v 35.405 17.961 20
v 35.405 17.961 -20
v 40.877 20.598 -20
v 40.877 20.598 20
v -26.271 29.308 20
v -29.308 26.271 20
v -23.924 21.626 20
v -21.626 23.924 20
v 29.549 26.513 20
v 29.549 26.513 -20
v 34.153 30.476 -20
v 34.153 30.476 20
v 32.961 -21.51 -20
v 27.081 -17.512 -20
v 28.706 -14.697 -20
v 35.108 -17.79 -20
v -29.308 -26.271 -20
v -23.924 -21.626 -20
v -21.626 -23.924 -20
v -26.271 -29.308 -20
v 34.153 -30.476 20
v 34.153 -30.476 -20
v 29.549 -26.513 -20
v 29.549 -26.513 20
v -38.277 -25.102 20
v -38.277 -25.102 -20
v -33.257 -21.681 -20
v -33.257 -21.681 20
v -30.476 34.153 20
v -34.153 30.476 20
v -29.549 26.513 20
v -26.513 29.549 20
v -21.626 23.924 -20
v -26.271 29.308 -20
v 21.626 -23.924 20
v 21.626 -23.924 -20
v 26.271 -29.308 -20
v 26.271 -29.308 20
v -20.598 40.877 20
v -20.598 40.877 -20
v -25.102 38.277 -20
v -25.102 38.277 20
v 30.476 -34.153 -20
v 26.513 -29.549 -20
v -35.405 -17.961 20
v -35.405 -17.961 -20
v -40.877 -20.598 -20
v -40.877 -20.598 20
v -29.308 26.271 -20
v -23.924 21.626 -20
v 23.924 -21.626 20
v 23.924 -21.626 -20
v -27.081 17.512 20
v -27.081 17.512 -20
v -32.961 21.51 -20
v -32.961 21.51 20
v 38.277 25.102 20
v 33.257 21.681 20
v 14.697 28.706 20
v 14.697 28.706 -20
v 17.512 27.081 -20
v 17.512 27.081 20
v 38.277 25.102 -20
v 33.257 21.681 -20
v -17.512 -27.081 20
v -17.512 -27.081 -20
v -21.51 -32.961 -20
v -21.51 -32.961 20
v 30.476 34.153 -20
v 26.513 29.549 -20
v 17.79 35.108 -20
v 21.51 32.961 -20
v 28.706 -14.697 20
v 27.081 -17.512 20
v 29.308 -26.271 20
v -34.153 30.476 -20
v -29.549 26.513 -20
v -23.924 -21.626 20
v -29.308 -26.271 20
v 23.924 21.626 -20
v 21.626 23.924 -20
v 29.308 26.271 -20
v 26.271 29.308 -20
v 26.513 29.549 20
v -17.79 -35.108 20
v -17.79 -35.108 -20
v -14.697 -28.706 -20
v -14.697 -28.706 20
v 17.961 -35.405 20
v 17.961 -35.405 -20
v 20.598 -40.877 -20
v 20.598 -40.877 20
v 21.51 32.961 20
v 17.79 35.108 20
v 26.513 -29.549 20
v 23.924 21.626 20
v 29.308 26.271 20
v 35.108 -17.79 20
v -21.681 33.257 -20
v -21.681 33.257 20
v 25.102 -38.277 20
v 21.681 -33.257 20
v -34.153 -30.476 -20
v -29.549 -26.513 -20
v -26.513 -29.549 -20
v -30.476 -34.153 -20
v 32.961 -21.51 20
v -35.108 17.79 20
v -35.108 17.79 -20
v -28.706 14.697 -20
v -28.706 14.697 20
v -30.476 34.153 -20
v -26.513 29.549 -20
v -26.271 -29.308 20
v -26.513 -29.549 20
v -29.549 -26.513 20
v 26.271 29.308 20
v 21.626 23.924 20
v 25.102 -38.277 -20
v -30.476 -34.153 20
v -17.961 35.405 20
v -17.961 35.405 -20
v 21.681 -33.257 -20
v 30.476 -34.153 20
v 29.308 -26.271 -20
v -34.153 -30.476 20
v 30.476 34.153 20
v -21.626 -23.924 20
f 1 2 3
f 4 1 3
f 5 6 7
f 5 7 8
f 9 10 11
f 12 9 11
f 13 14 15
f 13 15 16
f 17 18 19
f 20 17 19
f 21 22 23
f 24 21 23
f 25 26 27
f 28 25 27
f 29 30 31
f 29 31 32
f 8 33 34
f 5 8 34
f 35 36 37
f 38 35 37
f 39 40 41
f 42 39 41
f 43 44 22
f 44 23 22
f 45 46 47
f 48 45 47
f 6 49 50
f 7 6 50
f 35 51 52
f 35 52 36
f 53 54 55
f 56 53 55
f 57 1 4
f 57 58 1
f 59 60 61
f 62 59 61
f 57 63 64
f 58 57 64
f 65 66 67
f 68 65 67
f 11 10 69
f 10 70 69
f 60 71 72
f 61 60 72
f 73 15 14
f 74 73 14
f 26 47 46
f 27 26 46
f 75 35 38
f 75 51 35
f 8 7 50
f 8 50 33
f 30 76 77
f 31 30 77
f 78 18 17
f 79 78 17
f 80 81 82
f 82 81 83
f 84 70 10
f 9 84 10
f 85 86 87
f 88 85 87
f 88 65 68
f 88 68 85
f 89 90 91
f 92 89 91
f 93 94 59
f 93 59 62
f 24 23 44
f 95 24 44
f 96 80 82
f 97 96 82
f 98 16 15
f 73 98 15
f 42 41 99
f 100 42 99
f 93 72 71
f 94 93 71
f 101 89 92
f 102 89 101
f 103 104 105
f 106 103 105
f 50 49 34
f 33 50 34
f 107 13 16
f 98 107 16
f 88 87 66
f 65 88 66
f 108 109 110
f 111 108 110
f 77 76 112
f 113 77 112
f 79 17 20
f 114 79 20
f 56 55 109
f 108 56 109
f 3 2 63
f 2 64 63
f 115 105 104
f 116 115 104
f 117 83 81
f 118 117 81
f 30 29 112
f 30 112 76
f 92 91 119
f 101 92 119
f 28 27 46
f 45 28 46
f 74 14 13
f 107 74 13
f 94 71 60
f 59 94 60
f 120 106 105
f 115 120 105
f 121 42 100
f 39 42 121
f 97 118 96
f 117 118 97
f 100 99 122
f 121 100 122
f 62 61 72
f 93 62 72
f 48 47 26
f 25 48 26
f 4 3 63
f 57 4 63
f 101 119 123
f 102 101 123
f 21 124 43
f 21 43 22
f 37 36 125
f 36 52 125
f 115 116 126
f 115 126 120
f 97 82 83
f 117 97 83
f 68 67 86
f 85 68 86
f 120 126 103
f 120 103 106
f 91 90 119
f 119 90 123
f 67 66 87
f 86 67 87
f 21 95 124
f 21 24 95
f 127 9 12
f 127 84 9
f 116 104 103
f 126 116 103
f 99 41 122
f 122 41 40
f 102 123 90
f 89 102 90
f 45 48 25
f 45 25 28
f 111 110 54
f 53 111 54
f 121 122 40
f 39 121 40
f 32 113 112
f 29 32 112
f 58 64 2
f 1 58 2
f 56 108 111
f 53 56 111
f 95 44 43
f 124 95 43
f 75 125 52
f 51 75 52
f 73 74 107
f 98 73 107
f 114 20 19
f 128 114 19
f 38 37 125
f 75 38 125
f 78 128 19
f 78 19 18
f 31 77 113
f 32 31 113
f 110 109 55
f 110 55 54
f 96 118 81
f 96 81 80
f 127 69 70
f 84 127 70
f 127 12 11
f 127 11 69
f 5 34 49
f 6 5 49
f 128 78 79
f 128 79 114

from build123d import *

# Parameters (mm, degrees)
COIL_SIDES_START    = -20
COIL_SIDES_DEPTH    = 40
COIL_SIDES_2_DEPTH  = 40
COIL_SIDES_3_DEPTH  = 40
COIL_SIDES_4_DEPTH  = 40
COIL_SIDES_5_DEPTH  = 40
COIL_SIDES_6_DEPTH  = 40
COIL_SIDES_7_DEPTH  = 40
COIL_SIDES_8_DEPTH  = 40
COIL_SIDES_9_DEPTH  = 40
COIL_SIDES_10_DEPTH = 40
COIL_SIDES_11_DEPTH = 40
COIL_SIDES_12_DEPTH = 40
COIL_SIDES_13_DEPTH = 40
COIL_SIDES_14_DEPTH = 40
COIL_SIDES_15_DEPTH = 40
COIL_SIDES_16_DEPTH = 40


with BuildPart() as part:
    # Эскиз1 → Coil_sides (new body)
    with BuildSketch(Plane.XY.offset(COIL_SIDES_START)):
        Polygon((35.404539789, 17.961307368), (40.877360953, 20.59833395), (38.277360953, 25.10166605), (33.25721836, 21.680577182), align=None)
    extrude(amount=COIL_SIDES_DEPTH)


with BuildPart() as body_2:
    # Эскиз1 → Coil_sides 2 (new body)
    with BuildSketch(Plane.XY.offset(COIL_SIDES_START)):
        Polygon((23.924274918, 21.626177879), (29.307682044, 26.270910957), (26.270910957, 29.307682044), (21.626177879, 23.924274918), align=None)
    extrude(amount=COIL_SIDES_2_DEPTH)


with BuildPart() as body_3:
    # Эскиз1 → Coil_sides 3 (new body)
    with BuildSketch(Plane.XY.offset(COIL_SIDES_START)):
        Polygon((29.549430928, 26.512659841), (34.153257531, 30.476302269), (30.476302269, 34.153257531), (26.512659841, 29.549430928), align=None)
    extrude(amount=COIL_SIDES_3_DEPTH)


with BuildPart() as body_4:
    # Эскиз1 → Coil_sides 4 (new body)
    with BuildSketch(Plane.XY.offset(COIL_SIDES_START)):
        Polygon((17.511808311, 27.081341726), (21.509634907, 32.961137654), (17.790365093, 35.108459083), (14.697225748, 28.706341726), align=None)
    extrude(amount=COIL_SIDES_4_DEPTH)


with BuildPart() as body_5:
    # Эскиз1 → Coil_sides 5 (new body)
    with BuildSketch(Plane.XY.offset(COIL_SIDES_START)):
        Polygon((-17.961307368, 35.404539789), (-20.59833395, 40.877360953), (-25.10166605, 38.277360953), (-21.680577182, 33.25721836), align=None)
    extrude(amount=COIL_SIDES_5_DEPTH)


with BuildPart() as body_6:
    # Эскиз1 → Coil_sides 6 (new body)
    with BuildSketch(Plane.XY.offset(COIL_SIDES_START)):
        Polygon((-21.626177879, 23.924274918), (-26.270910957, 29.307682044), (-29.307682044, 26.270910957), (-23.924274918, 21.626177879), align=None)
    extrude(amount=COIL_SIDES_6_DEPTH)


with BuildPart() as body_7:
    # Эскиз1 → Coil_sides 7 (new body)
    with BuildSketch(Plane.XY.offset(COIL_SIDES_START)):
        Polygon((-26.512659841, 29.549430928), (-30.476302269, 34.153257531), (-34.153257531, 30.476302269), (-29.549430928, 26.512659841), align=None)
    extrude(amount=COIL_SIDES_7_DEPTH)


with BuildPart() as body_8:
    # Эскиз1 → Coil_sides 8 (new body)
    with BuildSketch(Plane.XY.offset(COIL_SIDES_START)):
        Polygon((-27.081341726, 17.511808311), (-32.961137654, 21.509634907), (-35.108459083, 17.790365093), (-28.706341726, 14.697225748), align=None)
    extrude(amount=COIL_SIDES_8_DEPTH)


with BuildPart() as body_9:
    # Эскиз1 → Coil_sides 9 (new body)
    with BuildSketch(Plane.XY.offset(COIL_SIDES_START)):
        Polygon((-35.404539789, -17.961307368), (-40.877360953, -20.59833395), (-38.277360953, -25.10166605), (-33.25721836, -21.680577182), align=None)
    extrude(amount=COIL_SIDES_9_DEPTH)


with BuildPart() as body_10:
    # Эскиз1 → Coil_sides 10 (new body)
    with BuildSketch(Plane.XY.offset(COIL_SIDES_START)):
        Polygon((-23.924274918, -21.626177879), (-29.307682044, -26.270910957), (-26.270910957, -29.307682044), (-21.626177879, -23.924274918), align=None)
    extrude(amount=COIL_SIDES_10_DEPTH)


with BuildPart() as body_11:
    # Эскиз1 → Coil_sides 11 (new body)
    with BuildSketch(Plane.XY.offset(COIL_SIDES_START)):
        Polygon((-29.549430928, -26.512659841), (-34.153257531, -30.476302269), (-30.476302269, -34.153257531), (-26.512659841, -29.549430928), align=None)
    extrude(amount=COIL_SIDES_11_DEPTH)


with BuildPart() as body_12:
    # Эскиз1 → Coil_sides 12 (new body)
    with BuildSketch(Plane.XY.offset(COIL_SIDES_START)):
        Polygon((-17.511808311, -27.081341726), (-21.509634907, -32.961137654), (-17.790365093, -35.108459083), (-14.697225748, -28.706341726), align=None)
    extrude(amount=COIL_SIDES_12_DEPTH)


with BuildPart() as body_13:
    # Эскиз1 → Coil_sides 13 (new body)
    with BuildSketch(Plane.XY.offset(COIL_SIDES_START)):
        Polygon((17.961307368, -35.404539789), (20.59833395, -40.877360953), (25.10166605, -38.277360953), (21.680577182, -33.25721836), align=None)
    extrude(amount=COIL_SIDES_13_DEPTH)


with BuildPart() as body_14:
    # Эскиз1 → Coil_sides 14 (new body)
    with BuildSketch(Plane.XY.offset(COIL_SIDES_START)):
        Polygon((21.626177879, -23.924274918), (26.270910957, -29.307682044), (29.307682044, -26.270910957), (23.924274918, -21.626177879), align=None)
    extrude(amount=COIL_SIDES_14_DEPTH)


with BuildPart() as body_15:
    # Эскиз1 → Coil_sides 15 (new body)
    with BuildSketch(Plane.XY.offset(COIL_SIDES_START)):
        Polygon((26.512659841, -29.549430928), (30.476302269, -34.153257531), (34.153257531, -30.476302269), (29.549430928, -26.512659841), align=None)
    extrude(amount=COIL_SIDES_15_DEPTH)


with BuildPart() as body_16:
    # Эскиз1 → Coil_sides 16 (new body)
    with BuildSketch(Plane.XY.offset(COIL_SIDES_START)):
        Polygon((27.081341726, -17.511808311), (32.961137654, -21.509634907), (35.108459083, -17.790365093), (28.706341726, -14.697225748), align=None)
    extrude(amount=COIL_SIDES_16_DEPTH)


solid = Compound([part.part, body_2.part, body_3.part, body_4.part, body_5.part, body_6.part, body_7.part, body_8.part, body_9.part, body_10.part, body_11.part, body_12.part, body_13.part, body_14.part, body_15.part, body_16.part])
